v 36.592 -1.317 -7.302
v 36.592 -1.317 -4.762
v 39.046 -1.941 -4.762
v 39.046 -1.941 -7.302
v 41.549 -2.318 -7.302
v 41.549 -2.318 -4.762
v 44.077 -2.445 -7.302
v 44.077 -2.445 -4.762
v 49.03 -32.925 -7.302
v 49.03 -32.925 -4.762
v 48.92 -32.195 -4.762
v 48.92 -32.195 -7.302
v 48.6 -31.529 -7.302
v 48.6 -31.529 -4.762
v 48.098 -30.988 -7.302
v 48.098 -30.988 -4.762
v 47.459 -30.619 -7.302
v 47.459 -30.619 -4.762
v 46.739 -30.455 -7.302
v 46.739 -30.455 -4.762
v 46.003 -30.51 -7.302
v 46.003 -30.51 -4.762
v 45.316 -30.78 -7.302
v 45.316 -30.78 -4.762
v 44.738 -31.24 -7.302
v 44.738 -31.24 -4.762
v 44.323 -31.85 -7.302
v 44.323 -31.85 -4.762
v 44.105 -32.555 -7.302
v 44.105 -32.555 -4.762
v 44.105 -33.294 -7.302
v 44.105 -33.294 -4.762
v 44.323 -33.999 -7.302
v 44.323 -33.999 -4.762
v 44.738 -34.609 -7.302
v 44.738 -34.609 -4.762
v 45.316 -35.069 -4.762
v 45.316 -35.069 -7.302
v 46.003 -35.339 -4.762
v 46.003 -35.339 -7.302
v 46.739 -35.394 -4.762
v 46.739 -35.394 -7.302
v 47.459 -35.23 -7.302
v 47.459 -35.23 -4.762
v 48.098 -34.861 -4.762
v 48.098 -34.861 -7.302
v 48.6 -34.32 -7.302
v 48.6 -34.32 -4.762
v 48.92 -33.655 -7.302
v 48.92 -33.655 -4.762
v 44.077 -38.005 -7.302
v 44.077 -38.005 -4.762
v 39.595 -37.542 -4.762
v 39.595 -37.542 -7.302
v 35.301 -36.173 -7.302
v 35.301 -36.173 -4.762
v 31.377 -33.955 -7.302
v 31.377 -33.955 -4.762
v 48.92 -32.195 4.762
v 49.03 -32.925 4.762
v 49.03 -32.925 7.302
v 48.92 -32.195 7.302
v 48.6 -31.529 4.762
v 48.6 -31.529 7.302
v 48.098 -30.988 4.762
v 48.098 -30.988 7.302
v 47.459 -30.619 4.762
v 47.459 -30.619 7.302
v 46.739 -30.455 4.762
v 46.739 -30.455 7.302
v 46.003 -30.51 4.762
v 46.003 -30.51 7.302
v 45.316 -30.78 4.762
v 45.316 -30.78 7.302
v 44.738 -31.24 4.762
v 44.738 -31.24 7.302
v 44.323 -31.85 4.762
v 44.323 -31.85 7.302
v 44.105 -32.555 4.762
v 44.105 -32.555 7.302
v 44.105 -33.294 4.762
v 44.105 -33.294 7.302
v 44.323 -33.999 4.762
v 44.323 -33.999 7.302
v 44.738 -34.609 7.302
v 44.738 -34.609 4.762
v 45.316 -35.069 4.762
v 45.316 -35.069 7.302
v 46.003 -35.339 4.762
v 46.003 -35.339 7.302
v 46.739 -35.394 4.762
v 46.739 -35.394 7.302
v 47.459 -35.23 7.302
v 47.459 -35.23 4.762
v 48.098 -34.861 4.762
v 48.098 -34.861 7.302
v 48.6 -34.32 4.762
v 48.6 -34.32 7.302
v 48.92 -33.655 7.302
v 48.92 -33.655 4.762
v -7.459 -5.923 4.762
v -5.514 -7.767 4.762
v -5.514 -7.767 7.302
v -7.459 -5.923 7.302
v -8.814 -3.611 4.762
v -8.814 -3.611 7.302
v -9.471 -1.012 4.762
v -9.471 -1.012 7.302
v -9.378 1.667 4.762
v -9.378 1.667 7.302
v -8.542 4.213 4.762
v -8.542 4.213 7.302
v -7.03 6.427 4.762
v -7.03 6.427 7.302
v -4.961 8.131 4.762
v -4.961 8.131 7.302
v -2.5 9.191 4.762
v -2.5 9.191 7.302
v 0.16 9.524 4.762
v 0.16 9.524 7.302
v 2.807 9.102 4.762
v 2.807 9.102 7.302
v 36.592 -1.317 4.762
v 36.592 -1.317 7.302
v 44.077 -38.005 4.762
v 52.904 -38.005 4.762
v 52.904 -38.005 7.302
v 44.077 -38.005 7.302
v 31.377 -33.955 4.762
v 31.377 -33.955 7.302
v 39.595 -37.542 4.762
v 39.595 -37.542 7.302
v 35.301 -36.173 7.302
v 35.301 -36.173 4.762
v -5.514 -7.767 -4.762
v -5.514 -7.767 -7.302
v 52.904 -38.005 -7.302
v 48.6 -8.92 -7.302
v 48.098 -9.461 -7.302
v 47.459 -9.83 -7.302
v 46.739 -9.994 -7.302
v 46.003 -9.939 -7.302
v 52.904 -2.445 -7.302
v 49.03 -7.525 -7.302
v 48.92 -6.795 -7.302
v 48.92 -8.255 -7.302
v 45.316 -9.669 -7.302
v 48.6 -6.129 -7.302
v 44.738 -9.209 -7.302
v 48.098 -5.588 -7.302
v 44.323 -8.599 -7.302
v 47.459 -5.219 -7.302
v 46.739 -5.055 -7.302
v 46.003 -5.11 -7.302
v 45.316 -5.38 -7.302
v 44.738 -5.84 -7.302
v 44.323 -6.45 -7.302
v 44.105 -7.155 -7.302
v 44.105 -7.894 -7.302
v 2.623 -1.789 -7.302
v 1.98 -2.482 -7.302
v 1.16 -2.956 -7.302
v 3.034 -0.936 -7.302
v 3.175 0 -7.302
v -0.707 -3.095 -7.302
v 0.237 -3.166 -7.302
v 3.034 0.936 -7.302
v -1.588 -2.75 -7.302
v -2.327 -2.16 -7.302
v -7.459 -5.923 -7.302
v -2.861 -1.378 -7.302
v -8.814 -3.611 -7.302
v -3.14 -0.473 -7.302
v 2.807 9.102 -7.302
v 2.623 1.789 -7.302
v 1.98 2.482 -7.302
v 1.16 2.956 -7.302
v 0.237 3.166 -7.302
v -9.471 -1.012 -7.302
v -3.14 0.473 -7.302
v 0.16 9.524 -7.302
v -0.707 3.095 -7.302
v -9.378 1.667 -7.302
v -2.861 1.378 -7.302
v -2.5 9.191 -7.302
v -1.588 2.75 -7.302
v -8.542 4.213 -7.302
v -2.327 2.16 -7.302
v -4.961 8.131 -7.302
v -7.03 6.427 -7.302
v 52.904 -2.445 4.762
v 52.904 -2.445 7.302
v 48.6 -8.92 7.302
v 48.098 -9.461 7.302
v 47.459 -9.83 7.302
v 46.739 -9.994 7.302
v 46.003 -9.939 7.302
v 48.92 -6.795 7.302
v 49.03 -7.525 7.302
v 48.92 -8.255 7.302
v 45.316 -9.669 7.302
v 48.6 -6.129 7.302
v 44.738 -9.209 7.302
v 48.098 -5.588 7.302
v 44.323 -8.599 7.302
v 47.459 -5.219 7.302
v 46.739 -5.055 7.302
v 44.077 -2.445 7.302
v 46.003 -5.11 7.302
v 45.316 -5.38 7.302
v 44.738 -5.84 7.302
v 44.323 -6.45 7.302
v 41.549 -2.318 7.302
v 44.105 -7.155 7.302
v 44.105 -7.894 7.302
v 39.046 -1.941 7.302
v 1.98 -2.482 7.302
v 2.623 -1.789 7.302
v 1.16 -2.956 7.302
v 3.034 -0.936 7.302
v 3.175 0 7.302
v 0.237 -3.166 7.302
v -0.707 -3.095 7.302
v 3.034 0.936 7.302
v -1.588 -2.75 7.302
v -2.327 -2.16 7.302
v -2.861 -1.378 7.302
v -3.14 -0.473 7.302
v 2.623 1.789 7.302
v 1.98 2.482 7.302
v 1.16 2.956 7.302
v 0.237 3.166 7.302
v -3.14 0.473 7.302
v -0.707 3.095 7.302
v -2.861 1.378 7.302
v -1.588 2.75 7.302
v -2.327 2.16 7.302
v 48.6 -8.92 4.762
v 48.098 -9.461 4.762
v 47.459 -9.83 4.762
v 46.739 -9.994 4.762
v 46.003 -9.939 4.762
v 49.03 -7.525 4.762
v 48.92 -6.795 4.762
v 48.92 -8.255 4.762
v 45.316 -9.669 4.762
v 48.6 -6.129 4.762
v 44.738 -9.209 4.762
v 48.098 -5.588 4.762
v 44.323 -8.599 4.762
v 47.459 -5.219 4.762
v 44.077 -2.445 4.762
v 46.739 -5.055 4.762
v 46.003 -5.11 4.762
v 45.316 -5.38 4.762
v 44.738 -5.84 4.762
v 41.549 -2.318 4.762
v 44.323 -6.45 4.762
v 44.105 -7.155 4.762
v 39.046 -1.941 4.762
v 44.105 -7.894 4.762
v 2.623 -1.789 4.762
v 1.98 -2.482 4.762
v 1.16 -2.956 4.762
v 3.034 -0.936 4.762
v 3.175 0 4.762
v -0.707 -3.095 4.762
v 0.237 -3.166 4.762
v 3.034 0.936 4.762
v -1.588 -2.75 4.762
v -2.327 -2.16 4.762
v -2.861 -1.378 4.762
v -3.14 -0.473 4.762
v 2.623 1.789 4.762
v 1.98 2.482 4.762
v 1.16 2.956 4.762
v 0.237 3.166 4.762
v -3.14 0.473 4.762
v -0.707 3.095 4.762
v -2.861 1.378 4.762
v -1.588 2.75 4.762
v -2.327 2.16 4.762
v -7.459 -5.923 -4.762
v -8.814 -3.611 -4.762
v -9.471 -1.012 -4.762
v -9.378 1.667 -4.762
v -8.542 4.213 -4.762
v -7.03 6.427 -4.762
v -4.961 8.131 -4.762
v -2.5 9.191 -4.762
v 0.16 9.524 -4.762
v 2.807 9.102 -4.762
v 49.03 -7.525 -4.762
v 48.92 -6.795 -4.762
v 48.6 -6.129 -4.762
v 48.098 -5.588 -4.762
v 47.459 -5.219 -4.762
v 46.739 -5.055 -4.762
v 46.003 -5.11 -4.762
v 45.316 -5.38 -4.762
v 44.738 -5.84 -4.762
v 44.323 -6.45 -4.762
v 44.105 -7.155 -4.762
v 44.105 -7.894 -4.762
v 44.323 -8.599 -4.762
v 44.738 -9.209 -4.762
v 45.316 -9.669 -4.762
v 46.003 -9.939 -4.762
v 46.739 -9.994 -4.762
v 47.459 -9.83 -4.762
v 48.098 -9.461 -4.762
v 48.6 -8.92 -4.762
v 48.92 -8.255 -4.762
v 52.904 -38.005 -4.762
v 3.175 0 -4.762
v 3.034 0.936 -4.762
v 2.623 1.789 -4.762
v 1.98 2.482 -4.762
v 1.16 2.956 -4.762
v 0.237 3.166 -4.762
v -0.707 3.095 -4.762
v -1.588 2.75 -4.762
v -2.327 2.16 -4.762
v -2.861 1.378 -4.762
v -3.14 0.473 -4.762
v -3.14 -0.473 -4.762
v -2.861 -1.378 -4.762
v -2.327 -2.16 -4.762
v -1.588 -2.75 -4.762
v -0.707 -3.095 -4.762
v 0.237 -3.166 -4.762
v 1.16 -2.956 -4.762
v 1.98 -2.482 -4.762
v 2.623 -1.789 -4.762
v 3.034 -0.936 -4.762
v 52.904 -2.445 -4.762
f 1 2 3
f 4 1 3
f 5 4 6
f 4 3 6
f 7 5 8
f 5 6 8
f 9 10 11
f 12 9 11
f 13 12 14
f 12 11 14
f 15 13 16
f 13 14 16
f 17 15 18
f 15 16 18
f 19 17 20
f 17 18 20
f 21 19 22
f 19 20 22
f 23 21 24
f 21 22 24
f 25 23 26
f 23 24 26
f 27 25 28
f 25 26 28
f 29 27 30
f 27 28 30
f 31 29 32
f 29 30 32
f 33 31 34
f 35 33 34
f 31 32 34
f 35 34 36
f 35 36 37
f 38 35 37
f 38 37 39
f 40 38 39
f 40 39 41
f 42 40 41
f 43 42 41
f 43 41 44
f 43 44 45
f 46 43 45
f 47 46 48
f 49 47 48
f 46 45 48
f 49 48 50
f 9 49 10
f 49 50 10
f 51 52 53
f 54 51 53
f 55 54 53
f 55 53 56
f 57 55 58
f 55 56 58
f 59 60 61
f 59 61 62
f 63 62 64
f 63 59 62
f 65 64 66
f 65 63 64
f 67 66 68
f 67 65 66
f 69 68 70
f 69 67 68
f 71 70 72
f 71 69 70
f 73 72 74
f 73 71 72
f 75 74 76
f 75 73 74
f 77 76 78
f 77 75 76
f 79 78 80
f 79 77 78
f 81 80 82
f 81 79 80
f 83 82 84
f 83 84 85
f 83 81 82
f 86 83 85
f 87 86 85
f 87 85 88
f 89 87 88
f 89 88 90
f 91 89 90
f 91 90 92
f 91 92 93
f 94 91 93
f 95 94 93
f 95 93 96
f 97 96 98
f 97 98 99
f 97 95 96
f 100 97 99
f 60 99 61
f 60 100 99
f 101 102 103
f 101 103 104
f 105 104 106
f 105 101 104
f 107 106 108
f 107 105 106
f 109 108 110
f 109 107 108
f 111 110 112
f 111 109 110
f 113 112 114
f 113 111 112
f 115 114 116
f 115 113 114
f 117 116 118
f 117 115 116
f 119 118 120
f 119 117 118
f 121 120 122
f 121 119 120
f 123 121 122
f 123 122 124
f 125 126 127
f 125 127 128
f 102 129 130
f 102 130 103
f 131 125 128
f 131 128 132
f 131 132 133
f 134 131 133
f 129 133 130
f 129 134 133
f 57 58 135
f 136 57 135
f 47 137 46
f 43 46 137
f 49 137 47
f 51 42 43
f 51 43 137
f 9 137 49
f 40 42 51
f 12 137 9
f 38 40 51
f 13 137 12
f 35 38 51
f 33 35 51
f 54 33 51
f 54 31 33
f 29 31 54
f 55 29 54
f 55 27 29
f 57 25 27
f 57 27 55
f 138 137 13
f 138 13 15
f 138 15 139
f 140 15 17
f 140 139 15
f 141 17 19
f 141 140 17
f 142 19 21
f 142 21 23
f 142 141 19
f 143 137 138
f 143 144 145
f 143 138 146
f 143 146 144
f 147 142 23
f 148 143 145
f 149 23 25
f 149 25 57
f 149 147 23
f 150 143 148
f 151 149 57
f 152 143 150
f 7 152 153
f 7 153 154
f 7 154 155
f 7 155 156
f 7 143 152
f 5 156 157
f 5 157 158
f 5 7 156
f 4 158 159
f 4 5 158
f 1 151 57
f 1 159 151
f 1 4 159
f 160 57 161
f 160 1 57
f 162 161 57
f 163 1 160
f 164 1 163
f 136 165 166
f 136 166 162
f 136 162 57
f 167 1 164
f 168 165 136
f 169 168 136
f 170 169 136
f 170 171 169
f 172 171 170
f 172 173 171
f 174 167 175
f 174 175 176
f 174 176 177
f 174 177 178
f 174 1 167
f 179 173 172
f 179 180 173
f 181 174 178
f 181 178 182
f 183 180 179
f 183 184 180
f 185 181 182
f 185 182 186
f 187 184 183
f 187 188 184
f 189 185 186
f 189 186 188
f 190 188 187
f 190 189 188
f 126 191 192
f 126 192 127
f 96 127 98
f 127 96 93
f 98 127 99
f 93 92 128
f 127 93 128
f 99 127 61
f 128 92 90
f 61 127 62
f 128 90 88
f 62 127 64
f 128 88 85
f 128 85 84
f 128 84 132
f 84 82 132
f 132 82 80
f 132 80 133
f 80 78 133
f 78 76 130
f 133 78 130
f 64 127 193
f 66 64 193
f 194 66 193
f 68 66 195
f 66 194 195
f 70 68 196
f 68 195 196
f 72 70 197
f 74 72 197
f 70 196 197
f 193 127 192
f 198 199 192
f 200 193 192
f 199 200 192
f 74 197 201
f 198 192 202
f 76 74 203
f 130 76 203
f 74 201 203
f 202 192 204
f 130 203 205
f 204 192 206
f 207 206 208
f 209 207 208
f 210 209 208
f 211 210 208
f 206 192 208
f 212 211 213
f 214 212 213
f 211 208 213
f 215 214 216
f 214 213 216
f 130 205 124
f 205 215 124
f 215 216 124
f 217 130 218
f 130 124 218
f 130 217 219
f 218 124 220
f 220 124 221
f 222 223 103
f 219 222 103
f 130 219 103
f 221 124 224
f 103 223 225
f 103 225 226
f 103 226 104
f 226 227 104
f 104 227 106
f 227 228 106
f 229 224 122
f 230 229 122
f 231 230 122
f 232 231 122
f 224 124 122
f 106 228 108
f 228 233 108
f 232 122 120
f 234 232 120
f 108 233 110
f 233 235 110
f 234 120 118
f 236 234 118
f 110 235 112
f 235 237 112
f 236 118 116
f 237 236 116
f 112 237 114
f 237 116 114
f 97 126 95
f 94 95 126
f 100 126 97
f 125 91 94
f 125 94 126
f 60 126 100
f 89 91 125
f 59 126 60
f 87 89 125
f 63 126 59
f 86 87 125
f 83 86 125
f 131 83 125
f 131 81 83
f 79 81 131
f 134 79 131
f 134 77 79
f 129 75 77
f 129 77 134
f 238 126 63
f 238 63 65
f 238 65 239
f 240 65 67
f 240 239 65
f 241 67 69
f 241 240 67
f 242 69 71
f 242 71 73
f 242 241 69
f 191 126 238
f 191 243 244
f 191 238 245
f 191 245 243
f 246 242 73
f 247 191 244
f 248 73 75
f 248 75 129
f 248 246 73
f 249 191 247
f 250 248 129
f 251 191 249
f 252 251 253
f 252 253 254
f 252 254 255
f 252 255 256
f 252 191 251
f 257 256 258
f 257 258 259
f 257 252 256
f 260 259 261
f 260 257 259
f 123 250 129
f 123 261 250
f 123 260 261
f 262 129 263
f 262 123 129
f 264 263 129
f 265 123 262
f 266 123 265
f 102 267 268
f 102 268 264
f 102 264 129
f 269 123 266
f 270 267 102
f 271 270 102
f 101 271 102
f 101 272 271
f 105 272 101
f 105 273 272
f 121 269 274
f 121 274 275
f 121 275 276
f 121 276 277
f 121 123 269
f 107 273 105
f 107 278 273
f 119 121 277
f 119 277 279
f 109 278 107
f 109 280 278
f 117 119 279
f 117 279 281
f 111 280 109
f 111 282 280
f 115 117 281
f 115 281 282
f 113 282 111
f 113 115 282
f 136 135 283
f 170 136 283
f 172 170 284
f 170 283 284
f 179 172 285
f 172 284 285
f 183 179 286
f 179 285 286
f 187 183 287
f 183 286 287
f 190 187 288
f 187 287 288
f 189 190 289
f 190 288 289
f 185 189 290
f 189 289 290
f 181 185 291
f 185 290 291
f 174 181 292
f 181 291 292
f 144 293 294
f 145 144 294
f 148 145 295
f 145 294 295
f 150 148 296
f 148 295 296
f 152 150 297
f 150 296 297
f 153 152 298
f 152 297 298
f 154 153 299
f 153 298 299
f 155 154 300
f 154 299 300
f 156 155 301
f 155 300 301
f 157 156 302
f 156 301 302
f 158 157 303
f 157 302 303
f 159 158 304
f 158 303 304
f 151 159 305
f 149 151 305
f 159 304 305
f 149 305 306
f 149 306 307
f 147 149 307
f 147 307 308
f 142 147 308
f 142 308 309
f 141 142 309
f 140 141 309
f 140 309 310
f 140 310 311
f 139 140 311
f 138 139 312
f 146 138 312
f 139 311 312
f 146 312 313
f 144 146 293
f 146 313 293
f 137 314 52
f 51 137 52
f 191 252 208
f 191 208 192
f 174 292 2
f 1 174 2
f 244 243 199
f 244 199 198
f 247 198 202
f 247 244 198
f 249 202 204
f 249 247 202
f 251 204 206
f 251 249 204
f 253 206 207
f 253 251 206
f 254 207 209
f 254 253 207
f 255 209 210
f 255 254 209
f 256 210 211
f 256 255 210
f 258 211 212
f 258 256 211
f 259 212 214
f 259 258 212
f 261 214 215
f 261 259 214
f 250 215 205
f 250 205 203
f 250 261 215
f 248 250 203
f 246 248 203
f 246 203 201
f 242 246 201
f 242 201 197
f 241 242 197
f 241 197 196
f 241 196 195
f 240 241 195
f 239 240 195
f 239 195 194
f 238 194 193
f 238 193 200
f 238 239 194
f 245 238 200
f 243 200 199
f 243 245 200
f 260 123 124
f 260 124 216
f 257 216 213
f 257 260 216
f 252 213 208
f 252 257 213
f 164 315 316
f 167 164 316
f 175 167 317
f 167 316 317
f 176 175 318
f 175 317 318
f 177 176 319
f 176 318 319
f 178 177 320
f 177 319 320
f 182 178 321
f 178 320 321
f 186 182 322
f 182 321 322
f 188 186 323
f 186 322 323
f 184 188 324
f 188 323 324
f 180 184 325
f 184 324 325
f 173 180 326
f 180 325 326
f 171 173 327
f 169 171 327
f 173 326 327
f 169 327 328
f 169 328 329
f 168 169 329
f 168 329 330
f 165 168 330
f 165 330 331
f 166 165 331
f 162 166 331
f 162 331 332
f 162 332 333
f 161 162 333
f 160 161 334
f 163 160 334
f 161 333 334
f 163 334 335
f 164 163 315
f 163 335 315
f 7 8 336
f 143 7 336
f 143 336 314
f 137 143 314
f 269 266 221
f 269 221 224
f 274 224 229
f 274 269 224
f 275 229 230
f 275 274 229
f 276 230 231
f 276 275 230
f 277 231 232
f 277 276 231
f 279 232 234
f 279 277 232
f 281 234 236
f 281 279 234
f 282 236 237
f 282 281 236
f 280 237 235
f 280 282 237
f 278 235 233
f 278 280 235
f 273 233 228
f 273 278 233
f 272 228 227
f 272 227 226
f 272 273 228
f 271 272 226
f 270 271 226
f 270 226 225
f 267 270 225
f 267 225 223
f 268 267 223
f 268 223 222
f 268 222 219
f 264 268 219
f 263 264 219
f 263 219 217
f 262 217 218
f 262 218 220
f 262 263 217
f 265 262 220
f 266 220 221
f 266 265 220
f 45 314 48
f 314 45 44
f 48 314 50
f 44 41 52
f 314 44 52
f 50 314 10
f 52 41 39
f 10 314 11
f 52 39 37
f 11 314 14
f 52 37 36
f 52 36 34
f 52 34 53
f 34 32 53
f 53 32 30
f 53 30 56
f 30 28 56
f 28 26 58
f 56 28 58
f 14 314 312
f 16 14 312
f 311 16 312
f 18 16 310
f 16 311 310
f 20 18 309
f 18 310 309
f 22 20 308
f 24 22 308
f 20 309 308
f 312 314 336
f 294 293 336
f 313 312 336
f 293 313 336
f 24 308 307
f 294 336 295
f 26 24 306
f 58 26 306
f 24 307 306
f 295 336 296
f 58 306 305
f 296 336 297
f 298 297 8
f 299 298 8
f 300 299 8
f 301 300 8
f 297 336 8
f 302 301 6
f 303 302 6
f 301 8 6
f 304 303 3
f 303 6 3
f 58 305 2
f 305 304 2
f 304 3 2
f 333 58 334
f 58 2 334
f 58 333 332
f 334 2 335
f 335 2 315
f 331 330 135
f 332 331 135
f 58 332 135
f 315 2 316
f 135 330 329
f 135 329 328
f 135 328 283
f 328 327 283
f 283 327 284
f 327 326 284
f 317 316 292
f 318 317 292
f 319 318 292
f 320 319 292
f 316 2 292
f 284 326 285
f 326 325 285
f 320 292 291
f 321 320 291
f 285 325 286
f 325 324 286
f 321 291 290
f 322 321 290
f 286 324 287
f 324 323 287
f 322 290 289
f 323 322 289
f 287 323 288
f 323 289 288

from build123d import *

# Parameters (mm, degrees)
STEERING_START     = 4.7625
SKETCH1_R          = 2.4765
SKETCH1_R_2        = 3.175
STEERING_ARM_DEPTH = 2.54


with BuildPart() as part:
    # Sketch1 → Steering Arm (new body)
    with BuildSketch(Plane.XY.offset(STEERING_START)):
        with BuildLine():
            Line((2.806864922, 9.102040118), (36.59240598, -1.316662595))
            ThreePointArc((36.59240598, -1.316662595), (40.292641158, -2.160999603), (44.077379106, -2.444555614))
            Line((44.077379106, -2.444555614), (52.903879106, -2.444555614))
            Line((52.903879106, -2.444555614), (52.903879106, -38.004555614))
            Line((52.903879106, -38.004555614), (44.077379106, -38.004555614))
            ThreePointArc((44.077379106, -38.004555614), (37.412396269, -36.967694276), (31.377379106, -33.955113074))
            Line((31.377379106, -33.955113074), (-5.513607921, -7.766965476))
            ThreePointArc((-5.513607921, -7.766965476), (-8.542391459, 4.213451454), (2.806864922, 9.102040118))
        make_face()
        with Locations((46.553879106, -7.524555614)):
            Circle(SKETCH1_R, mode=Mode.SUBTRACT)
        with Locations((46.553879106, -32.924555614)):
            Circle(SKETCH1_R, mode=Mode.SUBTRACT)
        Circle(SKETCH1_R_2, mode=Mode.SUBTRACT)
    extrude(amount=STEERING_ARM_DEPTH)


with BuildPart() as body_2:
    # Steering Arm Mirror: mirrored copy
    add(part.part.mirror(Plane.XY))


solid = Compound([part.part, body_2.part])
